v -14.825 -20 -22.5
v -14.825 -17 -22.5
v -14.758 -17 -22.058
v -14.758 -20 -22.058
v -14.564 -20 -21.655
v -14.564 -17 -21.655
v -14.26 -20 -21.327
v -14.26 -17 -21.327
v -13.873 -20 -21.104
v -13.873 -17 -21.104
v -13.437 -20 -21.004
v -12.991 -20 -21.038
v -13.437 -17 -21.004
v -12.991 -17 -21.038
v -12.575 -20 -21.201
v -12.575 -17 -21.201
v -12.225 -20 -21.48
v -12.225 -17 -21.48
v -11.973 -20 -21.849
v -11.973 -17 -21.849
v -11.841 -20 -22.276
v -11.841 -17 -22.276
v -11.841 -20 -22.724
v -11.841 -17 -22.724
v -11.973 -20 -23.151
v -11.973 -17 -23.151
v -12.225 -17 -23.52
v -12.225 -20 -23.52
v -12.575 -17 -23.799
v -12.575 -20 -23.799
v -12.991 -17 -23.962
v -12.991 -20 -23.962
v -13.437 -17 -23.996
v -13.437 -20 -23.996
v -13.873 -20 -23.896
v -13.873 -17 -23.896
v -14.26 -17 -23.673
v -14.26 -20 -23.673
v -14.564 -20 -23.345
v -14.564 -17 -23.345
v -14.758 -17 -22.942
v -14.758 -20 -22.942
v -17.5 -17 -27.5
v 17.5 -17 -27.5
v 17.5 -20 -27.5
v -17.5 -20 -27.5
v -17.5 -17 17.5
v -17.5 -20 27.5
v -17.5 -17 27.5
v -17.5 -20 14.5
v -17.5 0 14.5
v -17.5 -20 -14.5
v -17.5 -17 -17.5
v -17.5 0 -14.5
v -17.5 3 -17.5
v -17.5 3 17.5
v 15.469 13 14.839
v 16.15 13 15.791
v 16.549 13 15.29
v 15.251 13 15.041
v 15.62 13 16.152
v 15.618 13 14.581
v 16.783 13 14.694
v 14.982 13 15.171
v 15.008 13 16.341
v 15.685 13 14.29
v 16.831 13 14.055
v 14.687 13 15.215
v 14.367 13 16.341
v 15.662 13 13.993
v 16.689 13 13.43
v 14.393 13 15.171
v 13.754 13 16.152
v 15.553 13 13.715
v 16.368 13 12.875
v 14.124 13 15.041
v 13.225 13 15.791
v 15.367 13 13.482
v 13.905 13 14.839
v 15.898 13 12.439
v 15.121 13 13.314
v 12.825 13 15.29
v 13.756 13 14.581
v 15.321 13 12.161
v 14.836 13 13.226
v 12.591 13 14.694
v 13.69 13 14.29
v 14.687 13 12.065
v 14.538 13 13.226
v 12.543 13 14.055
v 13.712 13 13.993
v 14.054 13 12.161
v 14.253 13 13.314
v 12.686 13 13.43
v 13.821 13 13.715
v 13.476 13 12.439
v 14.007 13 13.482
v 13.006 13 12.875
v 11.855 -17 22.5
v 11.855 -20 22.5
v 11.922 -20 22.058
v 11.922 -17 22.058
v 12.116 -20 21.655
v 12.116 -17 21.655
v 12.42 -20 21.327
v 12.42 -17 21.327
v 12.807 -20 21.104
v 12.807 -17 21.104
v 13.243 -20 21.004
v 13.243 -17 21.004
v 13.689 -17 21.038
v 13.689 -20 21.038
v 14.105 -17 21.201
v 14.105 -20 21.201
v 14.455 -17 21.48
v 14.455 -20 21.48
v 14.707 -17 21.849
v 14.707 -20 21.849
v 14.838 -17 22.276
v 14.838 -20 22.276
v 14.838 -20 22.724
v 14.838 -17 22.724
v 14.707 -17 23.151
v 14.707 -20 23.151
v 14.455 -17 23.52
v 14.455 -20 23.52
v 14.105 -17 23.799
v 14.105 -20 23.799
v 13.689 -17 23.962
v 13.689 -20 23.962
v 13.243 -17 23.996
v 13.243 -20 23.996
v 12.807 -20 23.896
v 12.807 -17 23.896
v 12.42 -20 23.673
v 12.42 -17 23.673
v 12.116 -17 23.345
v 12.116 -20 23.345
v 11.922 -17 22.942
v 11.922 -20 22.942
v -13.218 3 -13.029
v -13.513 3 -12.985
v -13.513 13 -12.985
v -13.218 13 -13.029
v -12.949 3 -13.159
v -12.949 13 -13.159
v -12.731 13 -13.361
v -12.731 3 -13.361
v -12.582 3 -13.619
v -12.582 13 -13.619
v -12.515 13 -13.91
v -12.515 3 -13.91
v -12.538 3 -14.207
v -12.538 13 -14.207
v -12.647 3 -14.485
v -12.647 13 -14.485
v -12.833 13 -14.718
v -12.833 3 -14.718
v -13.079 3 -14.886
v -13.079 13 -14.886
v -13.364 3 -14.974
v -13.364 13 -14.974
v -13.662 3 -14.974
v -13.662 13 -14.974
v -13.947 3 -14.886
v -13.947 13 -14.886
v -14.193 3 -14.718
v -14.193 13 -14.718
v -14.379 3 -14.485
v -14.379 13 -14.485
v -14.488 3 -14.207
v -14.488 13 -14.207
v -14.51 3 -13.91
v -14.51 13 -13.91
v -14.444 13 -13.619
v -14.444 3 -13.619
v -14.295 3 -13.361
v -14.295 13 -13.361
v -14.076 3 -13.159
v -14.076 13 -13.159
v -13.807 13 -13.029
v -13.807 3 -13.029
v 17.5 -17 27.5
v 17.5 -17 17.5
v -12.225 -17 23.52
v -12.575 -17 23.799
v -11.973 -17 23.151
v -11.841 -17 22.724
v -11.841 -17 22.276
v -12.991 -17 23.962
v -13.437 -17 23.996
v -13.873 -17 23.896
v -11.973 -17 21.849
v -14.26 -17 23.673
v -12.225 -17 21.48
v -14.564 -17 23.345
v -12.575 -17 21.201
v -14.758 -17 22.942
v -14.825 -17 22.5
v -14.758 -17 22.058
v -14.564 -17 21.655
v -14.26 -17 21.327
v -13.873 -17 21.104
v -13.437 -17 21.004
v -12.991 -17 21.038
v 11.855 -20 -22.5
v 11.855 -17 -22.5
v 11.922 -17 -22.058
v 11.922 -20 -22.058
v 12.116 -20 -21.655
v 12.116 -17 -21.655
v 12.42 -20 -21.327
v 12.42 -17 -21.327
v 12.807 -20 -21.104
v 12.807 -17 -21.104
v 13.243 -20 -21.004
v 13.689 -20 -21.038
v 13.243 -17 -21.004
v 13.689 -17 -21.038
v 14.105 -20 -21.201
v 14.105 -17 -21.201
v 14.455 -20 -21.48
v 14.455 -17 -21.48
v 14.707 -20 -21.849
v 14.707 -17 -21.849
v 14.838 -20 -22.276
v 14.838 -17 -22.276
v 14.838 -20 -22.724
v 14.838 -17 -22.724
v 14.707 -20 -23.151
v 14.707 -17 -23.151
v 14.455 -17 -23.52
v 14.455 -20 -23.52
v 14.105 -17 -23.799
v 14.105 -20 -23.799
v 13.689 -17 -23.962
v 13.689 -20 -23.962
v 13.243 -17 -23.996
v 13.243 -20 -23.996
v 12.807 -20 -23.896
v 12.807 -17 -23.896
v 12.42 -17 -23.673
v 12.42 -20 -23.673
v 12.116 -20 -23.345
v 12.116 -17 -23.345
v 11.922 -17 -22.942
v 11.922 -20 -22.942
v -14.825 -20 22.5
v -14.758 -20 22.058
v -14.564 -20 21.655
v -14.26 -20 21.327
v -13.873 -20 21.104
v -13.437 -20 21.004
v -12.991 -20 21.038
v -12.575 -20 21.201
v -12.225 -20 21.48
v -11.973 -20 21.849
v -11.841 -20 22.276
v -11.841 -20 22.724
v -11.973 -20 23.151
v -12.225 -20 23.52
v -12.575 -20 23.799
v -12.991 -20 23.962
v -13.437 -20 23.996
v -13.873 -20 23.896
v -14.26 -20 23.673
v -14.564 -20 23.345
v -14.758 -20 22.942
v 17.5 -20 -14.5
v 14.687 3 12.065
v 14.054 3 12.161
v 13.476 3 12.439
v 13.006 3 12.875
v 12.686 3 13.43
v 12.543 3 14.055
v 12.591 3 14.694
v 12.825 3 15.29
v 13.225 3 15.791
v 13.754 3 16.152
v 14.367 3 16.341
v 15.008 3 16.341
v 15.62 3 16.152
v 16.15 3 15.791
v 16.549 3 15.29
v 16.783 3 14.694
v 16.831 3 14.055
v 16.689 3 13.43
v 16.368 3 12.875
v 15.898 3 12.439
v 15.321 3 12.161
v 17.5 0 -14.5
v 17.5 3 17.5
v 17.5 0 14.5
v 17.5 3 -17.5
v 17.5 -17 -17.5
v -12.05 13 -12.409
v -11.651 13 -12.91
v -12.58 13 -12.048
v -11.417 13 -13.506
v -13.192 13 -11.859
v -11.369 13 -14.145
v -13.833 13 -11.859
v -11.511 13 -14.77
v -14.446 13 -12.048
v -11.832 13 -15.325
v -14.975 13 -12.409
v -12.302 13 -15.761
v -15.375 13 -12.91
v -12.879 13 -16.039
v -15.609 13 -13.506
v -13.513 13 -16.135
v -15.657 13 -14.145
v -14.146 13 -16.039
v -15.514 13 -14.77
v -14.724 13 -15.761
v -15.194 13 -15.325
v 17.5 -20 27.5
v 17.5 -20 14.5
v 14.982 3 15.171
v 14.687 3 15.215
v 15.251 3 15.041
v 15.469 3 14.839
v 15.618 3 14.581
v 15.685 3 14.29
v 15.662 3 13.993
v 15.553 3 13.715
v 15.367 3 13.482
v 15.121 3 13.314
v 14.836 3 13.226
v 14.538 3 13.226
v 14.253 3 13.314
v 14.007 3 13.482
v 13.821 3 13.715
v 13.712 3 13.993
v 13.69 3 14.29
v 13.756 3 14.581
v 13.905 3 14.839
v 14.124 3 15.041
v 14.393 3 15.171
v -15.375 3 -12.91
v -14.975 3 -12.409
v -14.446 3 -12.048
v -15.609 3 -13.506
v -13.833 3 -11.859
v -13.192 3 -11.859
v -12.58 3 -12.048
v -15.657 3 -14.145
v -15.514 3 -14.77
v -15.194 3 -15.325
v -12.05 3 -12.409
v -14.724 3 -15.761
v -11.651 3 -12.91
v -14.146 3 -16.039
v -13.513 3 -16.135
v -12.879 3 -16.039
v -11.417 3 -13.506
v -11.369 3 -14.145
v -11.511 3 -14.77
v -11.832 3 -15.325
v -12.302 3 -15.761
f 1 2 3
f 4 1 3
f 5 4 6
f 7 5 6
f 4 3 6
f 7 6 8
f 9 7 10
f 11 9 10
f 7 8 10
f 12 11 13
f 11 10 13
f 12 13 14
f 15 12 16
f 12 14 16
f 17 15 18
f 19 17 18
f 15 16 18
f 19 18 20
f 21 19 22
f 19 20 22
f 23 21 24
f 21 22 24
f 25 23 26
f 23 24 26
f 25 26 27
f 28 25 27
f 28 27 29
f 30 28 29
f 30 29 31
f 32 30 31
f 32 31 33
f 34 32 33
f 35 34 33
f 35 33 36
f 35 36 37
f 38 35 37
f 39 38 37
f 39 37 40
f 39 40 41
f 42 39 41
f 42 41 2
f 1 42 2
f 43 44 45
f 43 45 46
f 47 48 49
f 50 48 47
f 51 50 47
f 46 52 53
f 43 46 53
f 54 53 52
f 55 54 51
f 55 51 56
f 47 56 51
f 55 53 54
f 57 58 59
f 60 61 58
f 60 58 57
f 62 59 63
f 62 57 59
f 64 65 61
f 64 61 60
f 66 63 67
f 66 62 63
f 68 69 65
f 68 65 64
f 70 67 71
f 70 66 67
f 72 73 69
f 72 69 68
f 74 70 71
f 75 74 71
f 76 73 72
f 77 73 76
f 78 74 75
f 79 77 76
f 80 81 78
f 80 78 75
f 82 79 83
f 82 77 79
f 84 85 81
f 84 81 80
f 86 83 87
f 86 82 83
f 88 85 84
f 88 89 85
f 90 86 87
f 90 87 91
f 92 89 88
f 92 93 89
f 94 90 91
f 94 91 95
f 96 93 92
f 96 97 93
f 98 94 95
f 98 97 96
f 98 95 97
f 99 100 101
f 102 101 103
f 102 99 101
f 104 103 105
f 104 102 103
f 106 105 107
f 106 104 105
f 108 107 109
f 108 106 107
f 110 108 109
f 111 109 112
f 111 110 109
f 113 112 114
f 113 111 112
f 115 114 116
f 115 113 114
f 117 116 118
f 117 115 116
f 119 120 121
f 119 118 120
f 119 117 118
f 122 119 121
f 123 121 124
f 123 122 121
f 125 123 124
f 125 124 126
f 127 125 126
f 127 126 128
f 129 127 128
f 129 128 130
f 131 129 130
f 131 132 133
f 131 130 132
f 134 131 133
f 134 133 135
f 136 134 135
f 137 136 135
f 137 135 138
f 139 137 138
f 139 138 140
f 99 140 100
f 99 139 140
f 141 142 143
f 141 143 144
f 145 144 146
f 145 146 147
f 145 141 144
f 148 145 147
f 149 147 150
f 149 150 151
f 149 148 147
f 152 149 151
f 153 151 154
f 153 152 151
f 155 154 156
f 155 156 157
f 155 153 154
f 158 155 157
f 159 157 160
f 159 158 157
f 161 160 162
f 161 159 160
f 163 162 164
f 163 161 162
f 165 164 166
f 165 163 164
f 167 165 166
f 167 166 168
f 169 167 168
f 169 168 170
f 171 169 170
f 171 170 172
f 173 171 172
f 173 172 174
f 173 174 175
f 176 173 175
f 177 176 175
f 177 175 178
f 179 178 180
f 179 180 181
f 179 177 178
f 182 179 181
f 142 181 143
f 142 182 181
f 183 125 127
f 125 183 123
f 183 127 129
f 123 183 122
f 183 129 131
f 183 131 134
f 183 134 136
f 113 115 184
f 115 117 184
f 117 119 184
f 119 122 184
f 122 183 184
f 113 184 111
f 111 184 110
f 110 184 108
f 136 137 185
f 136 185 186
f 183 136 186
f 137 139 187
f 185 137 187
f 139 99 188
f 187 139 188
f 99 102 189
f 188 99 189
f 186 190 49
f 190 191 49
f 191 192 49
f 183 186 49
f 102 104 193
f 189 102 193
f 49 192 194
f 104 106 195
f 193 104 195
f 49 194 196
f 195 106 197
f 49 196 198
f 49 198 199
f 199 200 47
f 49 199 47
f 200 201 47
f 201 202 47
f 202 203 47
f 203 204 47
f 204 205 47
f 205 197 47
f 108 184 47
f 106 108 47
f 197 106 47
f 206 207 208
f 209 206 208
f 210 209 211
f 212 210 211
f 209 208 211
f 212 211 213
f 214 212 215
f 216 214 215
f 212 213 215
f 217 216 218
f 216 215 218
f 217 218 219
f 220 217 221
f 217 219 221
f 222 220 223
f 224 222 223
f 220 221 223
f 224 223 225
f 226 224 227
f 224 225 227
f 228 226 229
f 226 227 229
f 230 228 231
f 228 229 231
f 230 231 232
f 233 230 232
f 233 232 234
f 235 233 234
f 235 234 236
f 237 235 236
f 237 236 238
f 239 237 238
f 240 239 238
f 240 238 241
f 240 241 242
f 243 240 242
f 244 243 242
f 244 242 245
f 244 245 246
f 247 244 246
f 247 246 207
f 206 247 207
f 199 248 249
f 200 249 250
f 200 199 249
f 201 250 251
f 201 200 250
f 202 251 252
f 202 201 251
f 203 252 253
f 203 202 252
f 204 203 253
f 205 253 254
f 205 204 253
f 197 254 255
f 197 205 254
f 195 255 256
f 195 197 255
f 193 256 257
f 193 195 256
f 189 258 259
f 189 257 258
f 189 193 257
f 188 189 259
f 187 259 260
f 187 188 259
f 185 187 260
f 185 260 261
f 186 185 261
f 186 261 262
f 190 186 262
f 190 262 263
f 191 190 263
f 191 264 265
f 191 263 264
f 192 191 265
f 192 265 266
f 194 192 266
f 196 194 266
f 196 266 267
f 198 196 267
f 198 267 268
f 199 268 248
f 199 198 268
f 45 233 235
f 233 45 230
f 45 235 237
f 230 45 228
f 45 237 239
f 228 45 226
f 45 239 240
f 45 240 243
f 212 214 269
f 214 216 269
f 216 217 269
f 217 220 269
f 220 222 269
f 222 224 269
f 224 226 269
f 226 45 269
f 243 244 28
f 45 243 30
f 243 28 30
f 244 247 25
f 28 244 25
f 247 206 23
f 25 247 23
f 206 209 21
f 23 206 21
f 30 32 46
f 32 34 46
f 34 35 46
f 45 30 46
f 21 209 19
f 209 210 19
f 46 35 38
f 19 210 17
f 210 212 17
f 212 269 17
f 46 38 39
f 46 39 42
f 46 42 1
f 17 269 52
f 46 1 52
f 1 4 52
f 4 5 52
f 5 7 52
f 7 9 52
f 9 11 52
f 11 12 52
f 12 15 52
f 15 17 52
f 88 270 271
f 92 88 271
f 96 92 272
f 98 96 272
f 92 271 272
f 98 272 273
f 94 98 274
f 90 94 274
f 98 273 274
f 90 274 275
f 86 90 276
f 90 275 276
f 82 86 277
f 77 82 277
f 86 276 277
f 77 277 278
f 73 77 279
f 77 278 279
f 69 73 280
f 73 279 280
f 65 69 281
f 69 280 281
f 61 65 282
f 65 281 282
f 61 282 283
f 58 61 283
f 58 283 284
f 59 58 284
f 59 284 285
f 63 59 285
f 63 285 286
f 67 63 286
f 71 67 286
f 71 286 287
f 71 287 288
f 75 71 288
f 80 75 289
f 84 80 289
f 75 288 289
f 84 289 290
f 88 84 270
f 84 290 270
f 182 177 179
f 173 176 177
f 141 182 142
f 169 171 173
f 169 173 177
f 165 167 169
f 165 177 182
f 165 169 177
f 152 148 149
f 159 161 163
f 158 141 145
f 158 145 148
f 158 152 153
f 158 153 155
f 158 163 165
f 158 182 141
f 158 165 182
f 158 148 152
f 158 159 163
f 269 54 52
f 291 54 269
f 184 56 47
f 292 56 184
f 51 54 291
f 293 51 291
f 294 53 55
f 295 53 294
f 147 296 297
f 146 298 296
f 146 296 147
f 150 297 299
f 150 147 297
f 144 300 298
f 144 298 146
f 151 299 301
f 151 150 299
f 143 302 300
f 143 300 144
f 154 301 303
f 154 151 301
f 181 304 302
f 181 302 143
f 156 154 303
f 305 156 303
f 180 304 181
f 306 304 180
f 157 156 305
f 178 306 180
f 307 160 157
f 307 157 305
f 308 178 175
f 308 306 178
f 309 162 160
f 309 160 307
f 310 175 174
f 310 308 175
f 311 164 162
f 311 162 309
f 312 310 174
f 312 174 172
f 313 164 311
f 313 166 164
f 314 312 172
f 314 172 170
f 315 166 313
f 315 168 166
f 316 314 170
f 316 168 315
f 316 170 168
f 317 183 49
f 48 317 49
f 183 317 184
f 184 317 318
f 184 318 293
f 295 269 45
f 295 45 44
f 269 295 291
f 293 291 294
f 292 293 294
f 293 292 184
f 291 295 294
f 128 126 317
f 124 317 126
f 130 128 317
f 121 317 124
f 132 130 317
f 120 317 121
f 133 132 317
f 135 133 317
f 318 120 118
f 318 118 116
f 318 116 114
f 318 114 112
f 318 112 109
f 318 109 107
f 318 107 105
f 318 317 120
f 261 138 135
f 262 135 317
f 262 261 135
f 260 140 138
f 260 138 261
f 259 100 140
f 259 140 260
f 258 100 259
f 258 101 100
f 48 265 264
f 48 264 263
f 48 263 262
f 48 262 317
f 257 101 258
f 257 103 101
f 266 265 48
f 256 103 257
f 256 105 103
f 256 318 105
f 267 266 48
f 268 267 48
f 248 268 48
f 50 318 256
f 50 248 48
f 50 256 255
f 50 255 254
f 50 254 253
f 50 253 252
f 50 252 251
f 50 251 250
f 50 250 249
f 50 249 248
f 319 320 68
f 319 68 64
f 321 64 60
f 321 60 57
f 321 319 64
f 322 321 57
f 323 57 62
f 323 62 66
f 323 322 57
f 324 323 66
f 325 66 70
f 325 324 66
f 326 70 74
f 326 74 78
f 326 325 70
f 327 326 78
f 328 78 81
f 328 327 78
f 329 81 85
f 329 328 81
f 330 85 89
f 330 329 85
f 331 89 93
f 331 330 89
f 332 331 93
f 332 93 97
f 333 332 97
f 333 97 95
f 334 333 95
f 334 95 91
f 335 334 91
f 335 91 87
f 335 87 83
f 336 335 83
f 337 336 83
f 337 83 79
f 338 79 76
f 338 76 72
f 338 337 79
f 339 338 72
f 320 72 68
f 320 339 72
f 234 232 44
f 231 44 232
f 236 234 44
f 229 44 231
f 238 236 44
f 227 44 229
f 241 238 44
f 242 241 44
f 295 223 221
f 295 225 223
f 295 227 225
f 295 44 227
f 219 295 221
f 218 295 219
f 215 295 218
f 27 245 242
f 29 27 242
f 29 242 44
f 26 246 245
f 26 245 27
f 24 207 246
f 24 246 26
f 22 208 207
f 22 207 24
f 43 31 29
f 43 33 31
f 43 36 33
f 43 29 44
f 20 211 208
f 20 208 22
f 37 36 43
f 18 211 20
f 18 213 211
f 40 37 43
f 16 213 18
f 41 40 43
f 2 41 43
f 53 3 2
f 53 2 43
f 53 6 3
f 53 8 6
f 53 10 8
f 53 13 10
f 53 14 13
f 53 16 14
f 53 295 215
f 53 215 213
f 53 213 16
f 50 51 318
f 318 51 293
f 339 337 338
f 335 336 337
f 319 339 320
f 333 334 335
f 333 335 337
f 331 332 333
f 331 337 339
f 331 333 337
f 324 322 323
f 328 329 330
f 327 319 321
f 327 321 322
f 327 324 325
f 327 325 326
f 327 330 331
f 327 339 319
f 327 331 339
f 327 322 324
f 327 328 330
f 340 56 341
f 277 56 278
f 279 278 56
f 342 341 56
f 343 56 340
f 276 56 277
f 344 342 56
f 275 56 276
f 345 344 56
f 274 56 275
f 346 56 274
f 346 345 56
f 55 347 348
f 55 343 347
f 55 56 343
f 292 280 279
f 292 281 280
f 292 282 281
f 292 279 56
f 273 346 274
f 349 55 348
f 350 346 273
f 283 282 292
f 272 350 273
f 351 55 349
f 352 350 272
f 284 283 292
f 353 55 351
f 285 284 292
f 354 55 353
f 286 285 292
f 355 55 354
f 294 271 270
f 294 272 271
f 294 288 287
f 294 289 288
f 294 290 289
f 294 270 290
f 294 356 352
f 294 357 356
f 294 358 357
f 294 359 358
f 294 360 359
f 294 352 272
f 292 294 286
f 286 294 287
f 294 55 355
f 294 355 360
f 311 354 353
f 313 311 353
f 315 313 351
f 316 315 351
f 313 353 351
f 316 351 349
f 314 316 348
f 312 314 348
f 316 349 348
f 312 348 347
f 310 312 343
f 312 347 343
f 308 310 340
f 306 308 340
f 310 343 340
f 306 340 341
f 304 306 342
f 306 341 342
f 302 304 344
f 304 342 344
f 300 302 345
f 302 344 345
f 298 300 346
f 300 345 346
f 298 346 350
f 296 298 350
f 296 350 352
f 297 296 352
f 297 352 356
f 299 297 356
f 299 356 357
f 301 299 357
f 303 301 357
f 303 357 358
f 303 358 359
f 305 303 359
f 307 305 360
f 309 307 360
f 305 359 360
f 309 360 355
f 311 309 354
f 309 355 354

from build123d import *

# Parameters (mm, degrees)
SKETCH1_W           = 35
SKETCH1_H           = 35
BOSS_EXTRUDE1_DEPTH = 3
SKETCH2_R           = 2.15
SKETCH2_R_2         = 1
BOSS_EXTRUDE2_DEPTH = 10
SKETCH3_W           = 35
SKETCH3_H           = 3
BOSS_EXTRUDE3_DEPTH = 20
SKETCH4_W           = 35
SKETCH4_H           = 3
BOSS_EXTRUDE4_DEPTH = 10
SKETCH5_R           = 1.5
CUT_EXTRUDE1_DEPTH  = 10


with BuildPart() as part:
    # Sketch1 → Boss-Extrude1 (new body)
    with BuildSketch(Plane(origin=(0, 0, 0), x_dir=(1, 0, 0), z_dir=(0, 1, 0))):
        Rectangle(SKETCH1_W, SKETCH1_H)
    extrude(amount=BOSS_EXTRUDE1_DEPTH)

    # Sketch2 → Boss-Extrude2 (add)
    # profile 1 of 2: a face of its own
    with BuildSketch(Plane(origin=(0, 3, 0), x_dir=(1, 0, 0), z_dir=(0, 1, 0))):
        with Locations(Location((-13.512690171, 13.984805963, 0), (0, 0, 90))):
            Circle(SKETCH2_R)
        with Locations(Location((-13.512690171, 13.984805963, 0), (0, 0, 270))):
            Circle(SKETCH2_R_2, mode=Mode.SUBTRACT)
    # profile 2 of 2: a face of its own
    with BuildSketch(Plane(origin=(0, 3, 0), x_dir=(1, 0, 0), z_dir=(0, 1, 0))):
        with Locations(Location((14.687309829, -14.215194037, 0), (0, 0, 90))):
            Circle(SKETCH2_R)
        with Locations(Location((14.687309829, -14.215194037, 0), (0, 0, 270))):
            Circle(SKETCH2_R_2, mode=Mode.SUBTRACT)
    extrude(amount=BOSS_EXTRUDE2_DEPTH)

    # Sketch3 → Boss-Extrude3 (add)
    with BuildSketch(Plane.XZ):
        with Locations((0, 16)):
            Rectangle(SKETCH3_W, SKETCH3_H)
        with Locations((0, -16)):
            Rectangle(SKETCH3_W, SKETCH3_H)
    extrude(amount=BOSS_EXTRUDE3_DEPTH)

    # Sketch4 → Boss-Extrude4 (add)
    with BuildSketch(Plane(origin=(0, 0, -17.5), x_dir=(-1, 0, 0), z_dir=(0, 0, -1))):
        with Locations((0, -18.5)):
            Rectangle(SKETCH4_W, SKETCH4_H)
    boss_extrude4 = extrude(amount=BOSS_EXTRUDE4_DEPTH)

    # Sketch5 → Cut-Extrude1 (cut)
    with BuildSketch(Plane(origin=(0, -17, 0), x_dir=(1, 0, 0), z_dir=(0, 1, 0))):
        with Locations(Location((-13.324621587, 22.5, 0), (0, 0, 180))):
            Circle(SKETCH5_R)
        with Locations(Location((13.355252901, 22.5, 0), (0, 0, 180))):
            Circle(SKETCH5_R)
    cut_extrude1 = extrude(amount=-CUT_EXTRUDE1_DEPTH, mode=Mode.SUBTRACT)

    # Mirror1: Boss-Extrude4, Cut-Extrude1 across plane
    add(boss_extrude4.mirror(Plane.XY))
    add(cut_extrude1.mirror(Plane.XY), mode=Mode.SUBTRACT)


solid = part.part
